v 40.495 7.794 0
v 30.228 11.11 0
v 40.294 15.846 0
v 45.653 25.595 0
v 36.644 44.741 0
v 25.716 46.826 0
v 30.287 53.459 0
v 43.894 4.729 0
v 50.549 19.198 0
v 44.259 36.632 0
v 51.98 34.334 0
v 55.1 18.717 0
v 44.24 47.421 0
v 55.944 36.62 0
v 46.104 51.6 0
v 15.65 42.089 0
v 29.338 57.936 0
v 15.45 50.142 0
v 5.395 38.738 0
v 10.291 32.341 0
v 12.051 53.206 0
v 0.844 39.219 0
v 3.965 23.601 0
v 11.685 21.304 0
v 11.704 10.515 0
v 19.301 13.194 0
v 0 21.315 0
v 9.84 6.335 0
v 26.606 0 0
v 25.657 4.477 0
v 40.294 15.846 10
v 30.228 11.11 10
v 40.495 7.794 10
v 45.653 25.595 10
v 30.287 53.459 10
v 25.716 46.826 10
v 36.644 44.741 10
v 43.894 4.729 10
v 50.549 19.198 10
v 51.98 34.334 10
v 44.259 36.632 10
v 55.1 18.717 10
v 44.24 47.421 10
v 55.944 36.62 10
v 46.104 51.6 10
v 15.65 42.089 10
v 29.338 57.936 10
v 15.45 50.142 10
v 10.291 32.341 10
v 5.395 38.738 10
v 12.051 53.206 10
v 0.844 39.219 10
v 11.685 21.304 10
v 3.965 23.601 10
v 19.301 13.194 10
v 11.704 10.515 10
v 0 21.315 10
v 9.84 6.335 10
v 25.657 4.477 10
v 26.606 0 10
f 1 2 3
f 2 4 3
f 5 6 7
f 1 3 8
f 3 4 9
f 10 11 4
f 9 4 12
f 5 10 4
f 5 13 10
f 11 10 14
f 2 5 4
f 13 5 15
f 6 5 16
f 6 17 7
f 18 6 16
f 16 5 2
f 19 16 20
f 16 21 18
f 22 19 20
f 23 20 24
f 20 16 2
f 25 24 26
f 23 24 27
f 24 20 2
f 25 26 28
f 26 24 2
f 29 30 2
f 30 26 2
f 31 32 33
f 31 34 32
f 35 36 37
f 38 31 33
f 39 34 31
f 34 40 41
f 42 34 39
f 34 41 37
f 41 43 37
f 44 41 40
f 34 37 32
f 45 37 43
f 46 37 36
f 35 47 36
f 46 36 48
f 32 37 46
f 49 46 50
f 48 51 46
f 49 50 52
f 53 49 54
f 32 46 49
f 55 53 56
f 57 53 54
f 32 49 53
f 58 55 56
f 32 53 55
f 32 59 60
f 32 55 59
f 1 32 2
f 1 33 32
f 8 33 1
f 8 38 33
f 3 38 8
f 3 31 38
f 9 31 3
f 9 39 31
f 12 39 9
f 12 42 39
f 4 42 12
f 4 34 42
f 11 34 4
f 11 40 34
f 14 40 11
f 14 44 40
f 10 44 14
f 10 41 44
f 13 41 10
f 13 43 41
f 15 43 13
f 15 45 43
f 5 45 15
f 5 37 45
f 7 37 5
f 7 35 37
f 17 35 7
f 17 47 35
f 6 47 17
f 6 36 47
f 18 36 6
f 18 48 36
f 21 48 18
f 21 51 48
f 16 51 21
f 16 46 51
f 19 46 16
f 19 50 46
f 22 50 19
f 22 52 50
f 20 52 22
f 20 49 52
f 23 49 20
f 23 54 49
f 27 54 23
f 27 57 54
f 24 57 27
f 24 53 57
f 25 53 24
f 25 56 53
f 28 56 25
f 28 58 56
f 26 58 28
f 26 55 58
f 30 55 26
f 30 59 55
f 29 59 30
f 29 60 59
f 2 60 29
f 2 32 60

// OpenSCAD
$fn = 32;

// ----------------------------------------------------------------------
// Fan rotor section: 10 blades, 18 mm hub radius, 11 mm blades
// ----------------------------------------------------------------------

// --- parameters (mm) ---
profile_height = 10;      // extrusion height
profile_points = 30;      // points of the closed outline

profile = [[45.653, 25.595], [51.98, 34.334], [55.944, 36.62], [44.259, 36.632], [44.24, 47.421], [46.104, 51.6], [36.644, 44.741], [30.287, 53.459], [29.338, 57.936], [25.716, 46.826], [15.45, 50.142], [12.051, 53.206], [15.65, 42.089], [5.395, 38.738], [0.844, 39.219], [10.291, 32.341], [3.965, 23.601], [0, 21.315], [11.685, 21.304], [11.704, 10.515], [9.84, 6.335], [19.301, 13.194], [25.657, 4.477], [26.606, 0], [30.228, 11.11], [40.495, 7.794], [43.894, 4.729], [40.294, 15.846], [50.549, 19.198], [55.1, 18.717]];  // single closed polygon, 30 points, counter clockwise

// --- the one profile operation ---
linear_extrude(height = profile_height) polygon(points = profile);
